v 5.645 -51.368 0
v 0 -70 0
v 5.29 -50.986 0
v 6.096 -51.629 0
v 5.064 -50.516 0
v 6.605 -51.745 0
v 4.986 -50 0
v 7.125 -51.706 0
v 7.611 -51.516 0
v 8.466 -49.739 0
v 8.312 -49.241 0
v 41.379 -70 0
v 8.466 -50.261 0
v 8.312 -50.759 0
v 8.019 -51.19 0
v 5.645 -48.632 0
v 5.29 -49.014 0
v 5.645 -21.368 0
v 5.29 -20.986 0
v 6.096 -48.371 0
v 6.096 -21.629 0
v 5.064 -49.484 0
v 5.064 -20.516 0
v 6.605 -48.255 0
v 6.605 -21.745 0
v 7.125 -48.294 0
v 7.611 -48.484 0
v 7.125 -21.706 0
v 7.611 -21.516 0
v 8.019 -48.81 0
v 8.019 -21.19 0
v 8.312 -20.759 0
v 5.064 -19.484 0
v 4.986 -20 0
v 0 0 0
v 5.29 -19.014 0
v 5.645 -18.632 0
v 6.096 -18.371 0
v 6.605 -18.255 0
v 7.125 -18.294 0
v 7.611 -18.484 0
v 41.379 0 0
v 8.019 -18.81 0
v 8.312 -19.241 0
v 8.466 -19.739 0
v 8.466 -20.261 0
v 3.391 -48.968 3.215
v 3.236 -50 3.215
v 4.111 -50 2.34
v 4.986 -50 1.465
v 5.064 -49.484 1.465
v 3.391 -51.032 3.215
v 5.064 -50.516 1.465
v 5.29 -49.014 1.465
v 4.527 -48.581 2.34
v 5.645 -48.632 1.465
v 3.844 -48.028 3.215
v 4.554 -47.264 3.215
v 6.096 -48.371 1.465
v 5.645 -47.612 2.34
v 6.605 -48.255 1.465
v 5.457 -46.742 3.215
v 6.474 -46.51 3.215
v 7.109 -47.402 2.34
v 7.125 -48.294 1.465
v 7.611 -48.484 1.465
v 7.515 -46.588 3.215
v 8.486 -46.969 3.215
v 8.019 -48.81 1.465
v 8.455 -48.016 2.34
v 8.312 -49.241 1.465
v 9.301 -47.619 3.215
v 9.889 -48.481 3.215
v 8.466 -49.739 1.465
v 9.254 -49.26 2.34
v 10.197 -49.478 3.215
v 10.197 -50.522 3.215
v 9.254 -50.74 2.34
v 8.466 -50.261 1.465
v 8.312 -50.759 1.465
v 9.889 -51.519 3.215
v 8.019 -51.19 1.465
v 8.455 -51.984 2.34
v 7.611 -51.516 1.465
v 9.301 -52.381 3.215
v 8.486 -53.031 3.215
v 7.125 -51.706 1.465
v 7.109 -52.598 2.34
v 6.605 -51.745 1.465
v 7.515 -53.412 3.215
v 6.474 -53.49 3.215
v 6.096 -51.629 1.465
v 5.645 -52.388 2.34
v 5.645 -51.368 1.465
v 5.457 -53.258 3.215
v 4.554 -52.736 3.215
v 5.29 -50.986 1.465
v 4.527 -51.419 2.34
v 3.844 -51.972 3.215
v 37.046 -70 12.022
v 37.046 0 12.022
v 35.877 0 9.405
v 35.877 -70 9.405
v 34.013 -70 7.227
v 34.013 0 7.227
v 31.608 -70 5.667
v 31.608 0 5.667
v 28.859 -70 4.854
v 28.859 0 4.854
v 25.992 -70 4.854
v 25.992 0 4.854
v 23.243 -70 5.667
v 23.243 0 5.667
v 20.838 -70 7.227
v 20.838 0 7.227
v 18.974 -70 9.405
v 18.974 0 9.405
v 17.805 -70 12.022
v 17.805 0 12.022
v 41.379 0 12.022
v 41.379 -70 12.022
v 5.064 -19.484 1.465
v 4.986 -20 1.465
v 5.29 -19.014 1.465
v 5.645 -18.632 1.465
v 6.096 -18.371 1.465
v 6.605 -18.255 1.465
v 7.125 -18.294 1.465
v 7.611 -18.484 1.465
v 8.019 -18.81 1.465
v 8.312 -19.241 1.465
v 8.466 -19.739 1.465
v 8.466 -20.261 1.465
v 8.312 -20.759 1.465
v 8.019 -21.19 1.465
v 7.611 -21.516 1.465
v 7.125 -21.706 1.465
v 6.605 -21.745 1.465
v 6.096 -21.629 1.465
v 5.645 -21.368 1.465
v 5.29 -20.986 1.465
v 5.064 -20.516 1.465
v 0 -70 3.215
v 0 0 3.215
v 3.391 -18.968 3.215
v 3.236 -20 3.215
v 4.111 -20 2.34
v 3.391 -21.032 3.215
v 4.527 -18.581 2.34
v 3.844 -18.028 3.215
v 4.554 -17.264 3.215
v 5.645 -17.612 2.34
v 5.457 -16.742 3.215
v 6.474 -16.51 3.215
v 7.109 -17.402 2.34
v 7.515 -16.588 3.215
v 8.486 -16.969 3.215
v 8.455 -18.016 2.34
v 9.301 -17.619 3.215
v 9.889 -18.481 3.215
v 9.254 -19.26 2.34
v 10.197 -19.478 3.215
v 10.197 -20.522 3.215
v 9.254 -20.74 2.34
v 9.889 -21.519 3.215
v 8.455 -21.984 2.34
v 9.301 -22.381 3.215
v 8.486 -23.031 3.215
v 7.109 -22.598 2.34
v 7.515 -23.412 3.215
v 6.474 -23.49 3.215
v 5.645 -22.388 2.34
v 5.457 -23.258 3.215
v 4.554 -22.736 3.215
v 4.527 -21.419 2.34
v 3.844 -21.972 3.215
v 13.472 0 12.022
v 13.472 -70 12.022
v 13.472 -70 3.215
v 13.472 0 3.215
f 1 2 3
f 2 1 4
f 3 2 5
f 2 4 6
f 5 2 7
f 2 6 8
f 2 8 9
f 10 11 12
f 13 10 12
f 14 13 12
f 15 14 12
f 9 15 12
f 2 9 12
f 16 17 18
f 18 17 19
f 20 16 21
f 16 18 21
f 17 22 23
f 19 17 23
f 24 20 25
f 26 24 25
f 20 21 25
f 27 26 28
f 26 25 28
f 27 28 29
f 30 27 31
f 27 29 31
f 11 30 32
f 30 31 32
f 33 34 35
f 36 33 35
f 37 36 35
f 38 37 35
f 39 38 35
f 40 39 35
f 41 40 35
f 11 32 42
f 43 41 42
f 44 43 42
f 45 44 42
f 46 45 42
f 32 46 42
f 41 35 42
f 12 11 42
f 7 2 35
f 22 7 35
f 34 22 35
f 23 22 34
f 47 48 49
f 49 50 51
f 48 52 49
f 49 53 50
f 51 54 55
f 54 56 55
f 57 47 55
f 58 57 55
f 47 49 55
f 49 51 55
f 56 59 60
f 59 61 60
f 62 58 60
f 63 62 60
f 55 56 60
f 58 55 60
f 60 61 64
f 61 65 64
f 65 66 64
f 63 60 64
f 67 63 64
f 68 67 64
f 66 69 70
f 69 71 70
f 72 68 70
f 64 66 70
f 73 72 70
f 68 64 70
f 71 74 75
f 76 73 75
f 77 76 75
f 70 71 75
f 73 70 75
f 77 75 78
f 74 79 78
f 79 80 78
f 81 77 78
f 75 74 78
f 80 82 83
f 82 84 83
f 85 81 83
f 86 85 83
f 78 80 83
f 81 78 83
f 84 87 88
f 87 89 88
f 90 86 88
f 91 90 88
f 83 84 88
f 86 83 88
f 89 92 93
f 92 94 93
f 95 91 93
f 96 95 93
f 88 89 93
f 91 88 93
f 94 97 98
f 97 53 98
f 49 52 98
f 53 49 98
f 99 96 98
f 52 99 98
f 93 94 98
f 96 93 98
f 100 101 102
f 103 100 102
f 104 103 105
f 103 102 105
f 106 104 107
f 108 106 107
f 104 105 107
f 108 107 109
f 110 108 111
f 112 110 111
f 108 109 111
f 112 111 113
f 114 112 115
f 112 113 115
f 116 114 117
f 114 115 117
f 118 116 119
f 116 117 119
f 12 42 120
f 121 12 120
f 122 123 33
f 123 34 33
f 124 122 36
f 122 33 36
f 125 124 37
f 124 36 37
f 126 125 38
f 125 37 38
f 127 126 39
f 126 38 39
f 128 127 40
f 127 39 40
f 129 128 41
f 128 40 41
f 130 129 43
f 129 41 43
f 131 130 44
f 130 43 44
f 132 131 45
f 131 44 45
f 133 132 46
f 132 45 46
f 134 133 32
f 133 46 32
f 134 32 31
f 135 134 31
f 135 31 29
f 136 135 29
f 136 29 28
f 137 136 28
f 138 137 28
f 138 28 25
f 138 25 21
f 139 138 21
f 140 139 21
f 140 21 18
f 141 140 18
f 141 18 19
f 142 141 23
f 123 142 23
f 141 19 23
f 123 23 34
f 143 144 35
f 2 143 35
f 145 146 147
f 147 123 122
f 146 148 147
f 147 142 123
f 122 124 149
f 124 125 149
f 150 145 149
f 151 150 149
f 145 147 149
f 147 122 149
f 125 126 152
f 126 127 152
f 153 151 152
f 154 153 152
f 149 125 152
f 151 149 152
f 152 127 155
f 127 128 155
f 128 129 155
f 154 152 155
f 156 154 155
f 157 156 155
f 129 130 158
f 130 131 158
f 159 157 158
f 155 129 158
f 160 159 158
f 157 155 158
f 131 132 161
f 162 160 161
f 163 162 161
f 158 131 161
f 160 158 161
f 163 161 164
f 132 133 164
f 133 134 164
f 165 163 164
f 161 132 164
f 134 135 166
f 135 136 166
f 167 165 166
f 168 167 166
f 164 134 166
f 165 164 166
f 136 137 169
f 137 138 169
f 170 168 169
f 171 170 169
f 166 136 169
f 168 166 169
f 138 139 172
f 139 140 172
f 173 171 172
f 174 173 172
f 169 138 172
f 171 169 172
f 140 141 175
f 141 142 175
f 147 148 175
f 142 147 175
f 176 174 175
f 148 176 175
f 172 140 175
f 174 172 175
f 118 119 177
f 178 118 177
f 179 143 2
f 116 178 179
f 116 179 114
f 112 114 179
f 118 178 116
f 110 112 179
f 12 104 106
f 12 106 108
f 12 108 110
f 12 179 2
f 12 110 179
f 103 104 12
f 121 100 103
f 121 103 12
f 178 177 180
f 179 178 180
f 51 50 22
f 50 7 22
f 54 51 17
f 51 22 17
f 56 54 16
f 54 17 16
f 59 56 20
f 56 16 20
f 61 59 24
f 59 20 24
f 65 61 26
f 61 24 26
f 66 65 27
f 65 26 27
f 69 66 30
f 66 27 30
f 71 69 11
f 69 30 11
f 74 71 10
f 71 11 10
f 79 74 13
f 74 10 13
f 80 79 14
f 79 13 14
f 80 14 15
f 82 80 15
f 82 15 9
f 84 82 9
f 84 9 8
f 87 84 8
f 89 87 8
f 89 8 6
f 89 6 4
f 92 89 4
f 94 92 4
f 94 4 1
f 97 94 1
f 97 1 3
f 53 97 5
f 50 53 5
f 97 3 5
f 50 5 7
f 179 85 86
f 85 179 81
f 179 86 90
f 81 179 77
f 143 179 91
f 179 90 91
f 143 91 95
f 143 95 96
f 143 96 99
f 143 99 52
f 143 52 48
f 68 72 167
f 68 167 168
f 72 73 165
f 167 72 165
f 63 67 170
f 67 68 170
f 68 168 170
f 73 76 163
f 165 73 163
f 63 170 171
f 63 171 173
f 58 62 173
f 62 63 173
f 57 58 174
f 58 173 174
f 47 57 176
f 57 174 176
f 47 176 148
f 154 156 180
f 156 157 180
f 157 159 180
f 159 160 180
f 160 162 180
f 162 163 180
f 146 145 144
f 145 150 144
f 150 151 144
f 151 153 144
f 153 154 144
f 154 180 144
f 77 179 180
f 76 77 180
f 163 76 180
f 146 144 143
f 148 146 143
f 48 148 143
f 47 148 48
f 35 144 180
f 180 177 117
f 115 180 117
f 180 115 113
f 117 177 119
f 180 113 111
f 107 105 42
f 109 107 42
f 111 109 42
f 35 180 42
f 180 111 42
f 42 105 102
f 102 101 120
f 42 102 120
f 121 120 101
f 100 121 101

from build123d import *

# Parameters (mm, degrees)
F2_DEPTH       = 70
F4_D           = 3.5
F4_CSINK_D     = 7
F4_CSINK_ANGLE = 90


with BuildPart() as f2:
    # F1 (on Front) → F2 (new body)
    with BuildSketch(Plane.XZ):
        with BuildLine():
            Line((0, 3.2153789857), (0, 0))
            Line((0, 0), (41.3793856046, 0))
            Line((41.3793856046, 0), (41.3793856046, 12.0218454194))
            Line((41.3793856046, 12.0218454194), (37.0459675166, 12.0218454194))
            ThreePointArc((37.0459675166, 12.0218454194), (27.4254767926, 4.7506103835), (17.8049860686, 12.0218454194))
            Line((17.8049860686, 12.0218454194), (13.4715679806, 12.0218454194))
            Line((13.4715679806, 12.0218454194), (13.4715679806, 3.2153789857))
            Line((13.4715679806, 3.2153789857), (0, 3.2153789857))
        make_face()
    extrude(amount=F2_DEPTH)

    # F4 (through all)
    with Locations(Plane.XY.offset(3.2153789857)):
        with Locations((6.7357839903, -20), (6.7357839903, -50)):
            CounterSinkHole(F4_D / 2, F4_CSINK_D / 2, counter_sink_angle=F4_CSINK_ANGLE)


solid = f2.part
